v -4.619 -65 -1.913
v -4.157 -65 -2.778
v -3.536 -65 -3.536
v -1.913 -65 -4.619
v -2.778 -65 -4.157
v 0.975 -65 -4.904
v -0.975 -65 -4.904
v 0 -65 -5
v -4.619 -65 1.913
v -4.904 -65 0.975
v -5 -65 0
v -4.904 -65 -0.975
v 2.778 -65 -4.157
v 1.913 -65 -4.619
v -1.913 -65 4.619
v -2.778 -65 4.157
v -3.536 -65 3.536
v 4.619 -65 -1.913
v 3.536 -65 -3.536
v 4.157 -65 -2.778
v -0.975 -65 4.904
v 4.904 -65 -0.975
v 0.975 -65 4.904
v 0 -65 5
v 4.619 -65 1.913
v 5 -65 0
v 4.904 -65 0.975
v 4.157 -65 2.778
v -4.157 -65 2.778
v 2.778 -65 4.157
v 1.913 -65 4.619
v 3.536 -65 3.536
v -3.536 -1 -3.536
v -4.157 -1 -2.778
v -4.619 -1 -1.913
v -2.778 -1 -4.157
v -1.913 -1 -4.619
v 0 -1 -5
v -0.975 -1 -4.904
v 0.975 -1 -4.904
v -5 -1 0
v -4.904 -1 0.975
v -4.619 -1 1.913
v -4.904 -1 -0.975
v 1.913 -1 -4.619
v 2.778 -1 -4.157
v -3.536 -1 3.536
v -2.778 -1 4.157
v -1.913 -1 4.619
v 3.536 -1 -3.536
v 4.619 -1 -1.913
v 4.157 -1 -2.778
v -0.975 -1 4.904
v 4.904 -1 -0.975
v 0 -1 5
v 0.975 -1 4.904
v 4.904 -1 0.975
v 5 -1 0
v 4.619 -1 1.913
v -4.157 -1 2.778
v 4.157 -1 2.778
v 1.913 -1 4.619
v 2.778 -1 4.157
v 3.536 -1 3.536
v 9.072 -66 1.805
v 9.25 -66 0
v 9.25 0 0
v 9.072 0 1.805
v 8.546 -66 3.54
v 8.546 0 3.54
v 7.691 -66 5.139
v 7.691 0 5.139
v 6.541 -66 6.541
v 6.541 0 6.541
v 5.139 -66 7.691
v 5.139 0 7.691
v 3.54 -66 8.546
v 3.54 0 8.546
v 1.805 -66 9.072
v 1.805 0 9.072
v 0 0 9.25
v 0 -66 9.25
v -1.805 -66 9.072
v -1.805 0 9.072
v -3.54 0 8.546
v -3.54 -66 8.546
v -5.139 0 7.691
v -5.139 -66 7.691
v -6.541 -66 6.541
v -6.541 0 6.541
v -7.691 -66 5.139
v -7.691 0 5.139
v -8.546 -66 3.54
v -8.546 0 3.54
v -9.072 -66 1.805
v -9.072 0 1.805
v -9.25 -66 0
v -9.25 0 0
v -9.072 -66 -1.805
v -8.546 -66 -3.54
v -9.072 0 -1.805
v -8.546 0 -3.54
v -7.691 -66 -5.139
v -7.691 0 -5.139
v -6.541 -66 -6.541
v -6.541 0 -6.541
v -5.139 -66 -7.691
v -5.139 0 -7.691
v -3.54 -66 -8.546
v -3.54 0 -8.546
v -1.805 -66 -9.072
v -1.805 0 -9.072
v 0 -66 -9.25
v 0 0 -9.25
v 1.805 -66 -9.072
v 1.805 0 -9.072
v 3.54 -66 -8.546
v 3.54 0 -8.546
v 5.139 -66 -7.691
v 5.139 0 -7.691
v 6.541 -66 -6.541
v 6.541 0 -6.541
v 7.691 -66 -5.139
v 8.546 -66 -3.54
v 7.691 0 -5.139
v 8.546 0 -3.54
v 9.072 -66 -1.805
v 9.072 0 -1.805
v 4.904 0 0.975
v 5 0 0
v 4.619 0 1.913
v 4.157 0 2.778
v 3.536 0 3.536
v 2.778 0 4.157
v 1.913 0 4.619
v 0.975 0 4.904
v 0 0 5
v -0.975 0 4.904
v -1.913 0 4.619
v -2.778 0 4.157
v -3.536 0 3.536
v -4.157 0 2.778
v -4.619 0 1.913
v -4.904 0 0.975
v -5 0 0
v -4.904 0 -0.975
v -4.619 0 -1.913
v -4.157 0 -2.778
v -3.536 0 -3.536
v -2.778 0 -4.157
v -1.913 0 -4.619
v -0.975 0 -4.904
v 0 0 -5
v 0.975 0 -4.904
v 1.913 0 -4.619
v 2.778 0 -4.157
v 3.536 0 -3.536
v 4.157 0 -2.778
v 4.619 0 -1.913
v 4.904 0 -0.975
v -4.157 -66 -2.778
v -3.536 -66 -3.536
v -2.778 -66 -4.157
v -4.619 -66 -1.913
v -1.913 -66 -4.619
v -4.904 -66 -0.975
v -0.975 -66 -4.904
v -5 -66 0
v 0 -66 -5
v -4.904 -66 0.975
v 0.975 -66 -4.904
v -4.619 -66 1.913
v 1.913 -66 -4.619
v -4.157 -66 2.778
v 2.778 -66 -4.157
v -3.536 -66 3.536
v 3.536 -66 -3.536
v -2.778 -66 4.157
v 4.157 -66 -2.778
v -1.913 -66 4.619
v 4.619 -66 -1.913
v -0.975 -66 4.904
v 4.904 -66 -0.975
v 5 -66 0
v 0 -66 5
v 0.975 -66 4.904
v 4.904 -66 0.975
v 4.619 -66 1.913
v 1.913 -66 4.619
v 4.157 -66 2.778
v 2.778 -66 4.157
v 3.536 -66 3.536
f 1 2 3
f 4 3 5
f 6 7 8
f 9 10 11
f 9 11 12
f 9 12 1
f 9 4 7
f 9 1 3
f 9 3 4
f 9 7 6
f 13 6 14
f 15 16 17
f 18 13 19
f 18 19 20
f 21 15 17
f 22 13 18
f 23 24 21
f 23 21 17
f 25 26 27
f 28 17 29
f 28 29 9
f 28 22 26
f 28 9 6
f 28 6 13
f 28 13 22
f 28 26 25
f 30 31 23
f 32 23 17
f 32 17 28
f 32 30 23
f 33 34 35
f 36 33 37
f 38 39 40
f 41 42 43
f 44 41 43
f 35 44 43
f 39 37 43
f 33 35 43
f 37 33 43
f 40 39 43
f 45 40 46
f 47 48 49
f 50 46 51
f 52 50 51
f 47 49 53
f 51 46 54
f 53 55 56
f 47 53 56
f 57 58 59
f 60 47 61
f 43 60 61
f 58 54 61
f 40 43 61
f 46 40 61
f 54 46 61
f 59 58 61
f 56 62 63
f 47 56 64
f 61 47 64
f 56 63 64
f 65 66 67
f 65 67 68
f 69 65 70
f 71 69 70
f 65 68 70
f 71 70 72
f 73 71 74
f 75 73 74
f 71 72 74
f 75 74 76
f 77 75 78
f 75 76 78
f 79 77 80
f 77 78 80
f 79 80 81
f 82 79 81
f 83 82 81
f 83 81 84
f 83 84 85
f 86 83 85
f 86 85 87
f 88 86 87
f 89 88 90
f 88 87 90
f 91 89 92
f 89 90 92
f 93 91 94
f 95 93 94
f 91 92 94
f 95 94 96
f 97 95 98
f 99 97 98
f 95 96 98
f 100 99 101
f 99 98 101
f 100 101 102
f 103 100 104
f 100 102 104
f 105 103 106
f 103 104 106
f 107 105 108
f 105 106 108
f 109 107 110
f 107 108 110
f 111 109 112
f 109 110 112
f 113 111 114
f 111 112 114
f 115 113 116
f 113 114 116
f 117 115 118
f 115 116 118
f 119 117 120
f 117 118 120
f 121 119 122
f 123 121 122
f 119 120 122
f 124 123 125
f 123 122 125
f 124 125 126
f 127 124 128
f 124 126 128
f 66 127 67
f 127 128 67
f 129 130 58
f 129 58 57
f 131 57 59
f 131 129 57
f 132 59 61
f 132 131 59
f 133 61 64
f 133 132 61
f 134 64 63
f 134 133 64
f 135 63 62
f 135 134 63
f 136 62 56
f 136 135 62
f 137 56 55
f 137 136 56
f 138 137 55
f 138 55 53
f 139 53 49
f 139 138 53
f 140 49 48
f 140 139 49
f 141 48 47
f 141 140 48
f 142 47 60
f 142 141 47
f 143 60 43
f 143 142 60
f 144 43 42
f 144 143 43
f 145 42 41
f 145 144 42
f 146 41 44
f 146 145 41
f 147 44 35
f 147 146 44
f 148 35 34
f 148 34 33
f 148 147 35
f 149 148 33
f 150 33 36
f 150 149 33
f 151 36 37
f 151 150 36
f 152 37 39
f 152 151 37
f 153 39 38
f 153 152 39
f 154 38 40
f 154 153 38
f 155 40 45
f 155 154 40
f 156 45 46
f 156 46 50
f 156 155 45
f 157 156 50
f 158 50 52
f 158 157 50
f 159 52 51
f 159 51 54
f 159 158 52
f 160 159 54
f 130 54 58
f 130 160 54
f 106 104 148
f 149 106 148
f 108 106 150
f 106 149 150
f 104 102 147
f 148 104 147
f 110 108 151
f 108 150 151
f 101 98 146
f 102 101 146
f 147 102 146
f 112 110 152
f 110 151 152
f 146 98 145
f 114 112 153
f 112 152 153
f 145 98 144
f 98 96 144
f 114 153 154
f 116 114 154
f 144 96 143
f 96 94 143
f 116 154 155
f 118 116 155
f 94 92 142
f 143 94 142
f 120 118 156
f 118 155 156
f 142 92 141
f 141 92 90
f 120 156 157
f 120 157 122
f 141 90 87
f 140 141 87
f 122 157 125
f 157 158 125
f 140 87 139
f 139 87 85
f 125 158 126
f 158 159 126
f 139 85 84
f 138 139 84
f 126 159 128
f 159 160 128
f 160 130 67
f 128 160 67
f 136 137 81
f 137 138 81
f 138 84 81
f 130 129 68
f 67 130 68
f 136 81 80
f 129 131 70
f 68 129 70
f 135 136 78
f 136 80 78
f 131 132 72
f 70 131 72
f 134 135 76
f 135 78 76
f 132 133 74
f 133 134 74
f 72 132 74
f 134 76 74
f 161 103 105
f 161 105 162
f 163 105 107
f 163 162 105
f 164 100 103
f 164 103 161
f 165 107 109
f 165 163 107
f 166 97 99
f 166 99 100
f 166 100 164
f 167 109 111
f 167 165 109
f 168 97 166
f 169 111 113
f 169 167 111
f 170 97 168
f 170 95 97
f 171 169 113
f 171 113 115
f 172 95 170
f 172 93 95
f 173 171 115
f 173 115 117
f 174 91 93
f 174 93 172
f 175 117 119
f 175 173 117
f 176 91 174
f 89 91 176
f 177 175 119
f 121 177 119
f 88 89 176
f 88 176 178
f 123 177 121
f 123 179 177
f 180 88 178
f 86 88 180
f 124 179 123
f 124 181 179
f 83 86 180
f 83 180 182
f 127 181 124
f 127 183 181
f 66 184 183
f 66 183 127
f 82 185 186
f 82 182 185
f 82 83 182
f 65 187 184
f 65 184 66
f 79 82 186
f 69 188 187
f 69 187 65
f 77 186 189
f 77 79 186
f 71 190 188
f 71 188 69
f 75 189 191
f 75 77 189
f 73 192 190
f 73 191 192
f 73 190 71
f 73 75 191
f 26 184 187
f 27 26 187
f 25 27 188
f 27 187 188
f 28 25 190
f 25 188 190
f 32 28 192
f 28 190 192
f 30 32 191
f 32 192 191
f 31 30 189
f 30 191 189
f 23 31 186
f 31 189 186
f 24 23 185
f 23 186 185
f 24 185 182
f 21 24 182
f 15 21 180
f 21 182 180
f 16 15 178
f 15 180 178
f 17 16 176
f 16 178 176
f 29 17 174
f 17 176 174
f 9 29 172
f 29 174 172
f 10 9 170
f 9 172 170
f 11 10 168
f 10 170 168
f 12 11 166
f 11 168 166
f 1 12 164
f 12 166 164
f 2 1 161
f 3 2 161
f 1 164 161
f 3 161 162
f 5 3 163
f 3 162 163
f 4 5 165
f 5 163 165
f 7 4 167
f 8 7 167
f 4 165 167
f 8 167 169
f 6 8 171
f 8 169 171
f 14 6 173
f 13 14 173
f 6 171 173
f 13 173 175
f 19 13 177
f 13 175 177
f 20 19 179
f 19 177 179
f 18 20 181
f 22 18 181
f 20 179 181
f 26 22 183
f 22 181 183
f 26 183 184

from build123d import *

# Parameters (mm, degrees)
F0_R     = 9.25
F1_DEPTH = 66
F2_R     = 5
F3_DEPTH = 1
F4_R     = 5
F5_DEPTH = 1


with BuildPart() as f1:
    # F0 (on Front) → F1 (new body)
    with BuildSketch(Plane.XZ):
        Circle(F0_R)
    extrude(amount=F1_DEPTH)

    # F2 (on Front) → F3 (cut)
    with BuildSketch(Plane.XZ):
        Circle(F2_R)
    extrude(amount=F3_DEPTH, mode=Mode.SUBTRACT)

    # F4 (on face) → F5 (cut)
    with BuildSketch(Plane.XZ.offset(66)):
        Circle(F4_R)
    extrude(amount=-F5_DEPTH, mode=Mode.SUBTRACT)


solid = f1.part
